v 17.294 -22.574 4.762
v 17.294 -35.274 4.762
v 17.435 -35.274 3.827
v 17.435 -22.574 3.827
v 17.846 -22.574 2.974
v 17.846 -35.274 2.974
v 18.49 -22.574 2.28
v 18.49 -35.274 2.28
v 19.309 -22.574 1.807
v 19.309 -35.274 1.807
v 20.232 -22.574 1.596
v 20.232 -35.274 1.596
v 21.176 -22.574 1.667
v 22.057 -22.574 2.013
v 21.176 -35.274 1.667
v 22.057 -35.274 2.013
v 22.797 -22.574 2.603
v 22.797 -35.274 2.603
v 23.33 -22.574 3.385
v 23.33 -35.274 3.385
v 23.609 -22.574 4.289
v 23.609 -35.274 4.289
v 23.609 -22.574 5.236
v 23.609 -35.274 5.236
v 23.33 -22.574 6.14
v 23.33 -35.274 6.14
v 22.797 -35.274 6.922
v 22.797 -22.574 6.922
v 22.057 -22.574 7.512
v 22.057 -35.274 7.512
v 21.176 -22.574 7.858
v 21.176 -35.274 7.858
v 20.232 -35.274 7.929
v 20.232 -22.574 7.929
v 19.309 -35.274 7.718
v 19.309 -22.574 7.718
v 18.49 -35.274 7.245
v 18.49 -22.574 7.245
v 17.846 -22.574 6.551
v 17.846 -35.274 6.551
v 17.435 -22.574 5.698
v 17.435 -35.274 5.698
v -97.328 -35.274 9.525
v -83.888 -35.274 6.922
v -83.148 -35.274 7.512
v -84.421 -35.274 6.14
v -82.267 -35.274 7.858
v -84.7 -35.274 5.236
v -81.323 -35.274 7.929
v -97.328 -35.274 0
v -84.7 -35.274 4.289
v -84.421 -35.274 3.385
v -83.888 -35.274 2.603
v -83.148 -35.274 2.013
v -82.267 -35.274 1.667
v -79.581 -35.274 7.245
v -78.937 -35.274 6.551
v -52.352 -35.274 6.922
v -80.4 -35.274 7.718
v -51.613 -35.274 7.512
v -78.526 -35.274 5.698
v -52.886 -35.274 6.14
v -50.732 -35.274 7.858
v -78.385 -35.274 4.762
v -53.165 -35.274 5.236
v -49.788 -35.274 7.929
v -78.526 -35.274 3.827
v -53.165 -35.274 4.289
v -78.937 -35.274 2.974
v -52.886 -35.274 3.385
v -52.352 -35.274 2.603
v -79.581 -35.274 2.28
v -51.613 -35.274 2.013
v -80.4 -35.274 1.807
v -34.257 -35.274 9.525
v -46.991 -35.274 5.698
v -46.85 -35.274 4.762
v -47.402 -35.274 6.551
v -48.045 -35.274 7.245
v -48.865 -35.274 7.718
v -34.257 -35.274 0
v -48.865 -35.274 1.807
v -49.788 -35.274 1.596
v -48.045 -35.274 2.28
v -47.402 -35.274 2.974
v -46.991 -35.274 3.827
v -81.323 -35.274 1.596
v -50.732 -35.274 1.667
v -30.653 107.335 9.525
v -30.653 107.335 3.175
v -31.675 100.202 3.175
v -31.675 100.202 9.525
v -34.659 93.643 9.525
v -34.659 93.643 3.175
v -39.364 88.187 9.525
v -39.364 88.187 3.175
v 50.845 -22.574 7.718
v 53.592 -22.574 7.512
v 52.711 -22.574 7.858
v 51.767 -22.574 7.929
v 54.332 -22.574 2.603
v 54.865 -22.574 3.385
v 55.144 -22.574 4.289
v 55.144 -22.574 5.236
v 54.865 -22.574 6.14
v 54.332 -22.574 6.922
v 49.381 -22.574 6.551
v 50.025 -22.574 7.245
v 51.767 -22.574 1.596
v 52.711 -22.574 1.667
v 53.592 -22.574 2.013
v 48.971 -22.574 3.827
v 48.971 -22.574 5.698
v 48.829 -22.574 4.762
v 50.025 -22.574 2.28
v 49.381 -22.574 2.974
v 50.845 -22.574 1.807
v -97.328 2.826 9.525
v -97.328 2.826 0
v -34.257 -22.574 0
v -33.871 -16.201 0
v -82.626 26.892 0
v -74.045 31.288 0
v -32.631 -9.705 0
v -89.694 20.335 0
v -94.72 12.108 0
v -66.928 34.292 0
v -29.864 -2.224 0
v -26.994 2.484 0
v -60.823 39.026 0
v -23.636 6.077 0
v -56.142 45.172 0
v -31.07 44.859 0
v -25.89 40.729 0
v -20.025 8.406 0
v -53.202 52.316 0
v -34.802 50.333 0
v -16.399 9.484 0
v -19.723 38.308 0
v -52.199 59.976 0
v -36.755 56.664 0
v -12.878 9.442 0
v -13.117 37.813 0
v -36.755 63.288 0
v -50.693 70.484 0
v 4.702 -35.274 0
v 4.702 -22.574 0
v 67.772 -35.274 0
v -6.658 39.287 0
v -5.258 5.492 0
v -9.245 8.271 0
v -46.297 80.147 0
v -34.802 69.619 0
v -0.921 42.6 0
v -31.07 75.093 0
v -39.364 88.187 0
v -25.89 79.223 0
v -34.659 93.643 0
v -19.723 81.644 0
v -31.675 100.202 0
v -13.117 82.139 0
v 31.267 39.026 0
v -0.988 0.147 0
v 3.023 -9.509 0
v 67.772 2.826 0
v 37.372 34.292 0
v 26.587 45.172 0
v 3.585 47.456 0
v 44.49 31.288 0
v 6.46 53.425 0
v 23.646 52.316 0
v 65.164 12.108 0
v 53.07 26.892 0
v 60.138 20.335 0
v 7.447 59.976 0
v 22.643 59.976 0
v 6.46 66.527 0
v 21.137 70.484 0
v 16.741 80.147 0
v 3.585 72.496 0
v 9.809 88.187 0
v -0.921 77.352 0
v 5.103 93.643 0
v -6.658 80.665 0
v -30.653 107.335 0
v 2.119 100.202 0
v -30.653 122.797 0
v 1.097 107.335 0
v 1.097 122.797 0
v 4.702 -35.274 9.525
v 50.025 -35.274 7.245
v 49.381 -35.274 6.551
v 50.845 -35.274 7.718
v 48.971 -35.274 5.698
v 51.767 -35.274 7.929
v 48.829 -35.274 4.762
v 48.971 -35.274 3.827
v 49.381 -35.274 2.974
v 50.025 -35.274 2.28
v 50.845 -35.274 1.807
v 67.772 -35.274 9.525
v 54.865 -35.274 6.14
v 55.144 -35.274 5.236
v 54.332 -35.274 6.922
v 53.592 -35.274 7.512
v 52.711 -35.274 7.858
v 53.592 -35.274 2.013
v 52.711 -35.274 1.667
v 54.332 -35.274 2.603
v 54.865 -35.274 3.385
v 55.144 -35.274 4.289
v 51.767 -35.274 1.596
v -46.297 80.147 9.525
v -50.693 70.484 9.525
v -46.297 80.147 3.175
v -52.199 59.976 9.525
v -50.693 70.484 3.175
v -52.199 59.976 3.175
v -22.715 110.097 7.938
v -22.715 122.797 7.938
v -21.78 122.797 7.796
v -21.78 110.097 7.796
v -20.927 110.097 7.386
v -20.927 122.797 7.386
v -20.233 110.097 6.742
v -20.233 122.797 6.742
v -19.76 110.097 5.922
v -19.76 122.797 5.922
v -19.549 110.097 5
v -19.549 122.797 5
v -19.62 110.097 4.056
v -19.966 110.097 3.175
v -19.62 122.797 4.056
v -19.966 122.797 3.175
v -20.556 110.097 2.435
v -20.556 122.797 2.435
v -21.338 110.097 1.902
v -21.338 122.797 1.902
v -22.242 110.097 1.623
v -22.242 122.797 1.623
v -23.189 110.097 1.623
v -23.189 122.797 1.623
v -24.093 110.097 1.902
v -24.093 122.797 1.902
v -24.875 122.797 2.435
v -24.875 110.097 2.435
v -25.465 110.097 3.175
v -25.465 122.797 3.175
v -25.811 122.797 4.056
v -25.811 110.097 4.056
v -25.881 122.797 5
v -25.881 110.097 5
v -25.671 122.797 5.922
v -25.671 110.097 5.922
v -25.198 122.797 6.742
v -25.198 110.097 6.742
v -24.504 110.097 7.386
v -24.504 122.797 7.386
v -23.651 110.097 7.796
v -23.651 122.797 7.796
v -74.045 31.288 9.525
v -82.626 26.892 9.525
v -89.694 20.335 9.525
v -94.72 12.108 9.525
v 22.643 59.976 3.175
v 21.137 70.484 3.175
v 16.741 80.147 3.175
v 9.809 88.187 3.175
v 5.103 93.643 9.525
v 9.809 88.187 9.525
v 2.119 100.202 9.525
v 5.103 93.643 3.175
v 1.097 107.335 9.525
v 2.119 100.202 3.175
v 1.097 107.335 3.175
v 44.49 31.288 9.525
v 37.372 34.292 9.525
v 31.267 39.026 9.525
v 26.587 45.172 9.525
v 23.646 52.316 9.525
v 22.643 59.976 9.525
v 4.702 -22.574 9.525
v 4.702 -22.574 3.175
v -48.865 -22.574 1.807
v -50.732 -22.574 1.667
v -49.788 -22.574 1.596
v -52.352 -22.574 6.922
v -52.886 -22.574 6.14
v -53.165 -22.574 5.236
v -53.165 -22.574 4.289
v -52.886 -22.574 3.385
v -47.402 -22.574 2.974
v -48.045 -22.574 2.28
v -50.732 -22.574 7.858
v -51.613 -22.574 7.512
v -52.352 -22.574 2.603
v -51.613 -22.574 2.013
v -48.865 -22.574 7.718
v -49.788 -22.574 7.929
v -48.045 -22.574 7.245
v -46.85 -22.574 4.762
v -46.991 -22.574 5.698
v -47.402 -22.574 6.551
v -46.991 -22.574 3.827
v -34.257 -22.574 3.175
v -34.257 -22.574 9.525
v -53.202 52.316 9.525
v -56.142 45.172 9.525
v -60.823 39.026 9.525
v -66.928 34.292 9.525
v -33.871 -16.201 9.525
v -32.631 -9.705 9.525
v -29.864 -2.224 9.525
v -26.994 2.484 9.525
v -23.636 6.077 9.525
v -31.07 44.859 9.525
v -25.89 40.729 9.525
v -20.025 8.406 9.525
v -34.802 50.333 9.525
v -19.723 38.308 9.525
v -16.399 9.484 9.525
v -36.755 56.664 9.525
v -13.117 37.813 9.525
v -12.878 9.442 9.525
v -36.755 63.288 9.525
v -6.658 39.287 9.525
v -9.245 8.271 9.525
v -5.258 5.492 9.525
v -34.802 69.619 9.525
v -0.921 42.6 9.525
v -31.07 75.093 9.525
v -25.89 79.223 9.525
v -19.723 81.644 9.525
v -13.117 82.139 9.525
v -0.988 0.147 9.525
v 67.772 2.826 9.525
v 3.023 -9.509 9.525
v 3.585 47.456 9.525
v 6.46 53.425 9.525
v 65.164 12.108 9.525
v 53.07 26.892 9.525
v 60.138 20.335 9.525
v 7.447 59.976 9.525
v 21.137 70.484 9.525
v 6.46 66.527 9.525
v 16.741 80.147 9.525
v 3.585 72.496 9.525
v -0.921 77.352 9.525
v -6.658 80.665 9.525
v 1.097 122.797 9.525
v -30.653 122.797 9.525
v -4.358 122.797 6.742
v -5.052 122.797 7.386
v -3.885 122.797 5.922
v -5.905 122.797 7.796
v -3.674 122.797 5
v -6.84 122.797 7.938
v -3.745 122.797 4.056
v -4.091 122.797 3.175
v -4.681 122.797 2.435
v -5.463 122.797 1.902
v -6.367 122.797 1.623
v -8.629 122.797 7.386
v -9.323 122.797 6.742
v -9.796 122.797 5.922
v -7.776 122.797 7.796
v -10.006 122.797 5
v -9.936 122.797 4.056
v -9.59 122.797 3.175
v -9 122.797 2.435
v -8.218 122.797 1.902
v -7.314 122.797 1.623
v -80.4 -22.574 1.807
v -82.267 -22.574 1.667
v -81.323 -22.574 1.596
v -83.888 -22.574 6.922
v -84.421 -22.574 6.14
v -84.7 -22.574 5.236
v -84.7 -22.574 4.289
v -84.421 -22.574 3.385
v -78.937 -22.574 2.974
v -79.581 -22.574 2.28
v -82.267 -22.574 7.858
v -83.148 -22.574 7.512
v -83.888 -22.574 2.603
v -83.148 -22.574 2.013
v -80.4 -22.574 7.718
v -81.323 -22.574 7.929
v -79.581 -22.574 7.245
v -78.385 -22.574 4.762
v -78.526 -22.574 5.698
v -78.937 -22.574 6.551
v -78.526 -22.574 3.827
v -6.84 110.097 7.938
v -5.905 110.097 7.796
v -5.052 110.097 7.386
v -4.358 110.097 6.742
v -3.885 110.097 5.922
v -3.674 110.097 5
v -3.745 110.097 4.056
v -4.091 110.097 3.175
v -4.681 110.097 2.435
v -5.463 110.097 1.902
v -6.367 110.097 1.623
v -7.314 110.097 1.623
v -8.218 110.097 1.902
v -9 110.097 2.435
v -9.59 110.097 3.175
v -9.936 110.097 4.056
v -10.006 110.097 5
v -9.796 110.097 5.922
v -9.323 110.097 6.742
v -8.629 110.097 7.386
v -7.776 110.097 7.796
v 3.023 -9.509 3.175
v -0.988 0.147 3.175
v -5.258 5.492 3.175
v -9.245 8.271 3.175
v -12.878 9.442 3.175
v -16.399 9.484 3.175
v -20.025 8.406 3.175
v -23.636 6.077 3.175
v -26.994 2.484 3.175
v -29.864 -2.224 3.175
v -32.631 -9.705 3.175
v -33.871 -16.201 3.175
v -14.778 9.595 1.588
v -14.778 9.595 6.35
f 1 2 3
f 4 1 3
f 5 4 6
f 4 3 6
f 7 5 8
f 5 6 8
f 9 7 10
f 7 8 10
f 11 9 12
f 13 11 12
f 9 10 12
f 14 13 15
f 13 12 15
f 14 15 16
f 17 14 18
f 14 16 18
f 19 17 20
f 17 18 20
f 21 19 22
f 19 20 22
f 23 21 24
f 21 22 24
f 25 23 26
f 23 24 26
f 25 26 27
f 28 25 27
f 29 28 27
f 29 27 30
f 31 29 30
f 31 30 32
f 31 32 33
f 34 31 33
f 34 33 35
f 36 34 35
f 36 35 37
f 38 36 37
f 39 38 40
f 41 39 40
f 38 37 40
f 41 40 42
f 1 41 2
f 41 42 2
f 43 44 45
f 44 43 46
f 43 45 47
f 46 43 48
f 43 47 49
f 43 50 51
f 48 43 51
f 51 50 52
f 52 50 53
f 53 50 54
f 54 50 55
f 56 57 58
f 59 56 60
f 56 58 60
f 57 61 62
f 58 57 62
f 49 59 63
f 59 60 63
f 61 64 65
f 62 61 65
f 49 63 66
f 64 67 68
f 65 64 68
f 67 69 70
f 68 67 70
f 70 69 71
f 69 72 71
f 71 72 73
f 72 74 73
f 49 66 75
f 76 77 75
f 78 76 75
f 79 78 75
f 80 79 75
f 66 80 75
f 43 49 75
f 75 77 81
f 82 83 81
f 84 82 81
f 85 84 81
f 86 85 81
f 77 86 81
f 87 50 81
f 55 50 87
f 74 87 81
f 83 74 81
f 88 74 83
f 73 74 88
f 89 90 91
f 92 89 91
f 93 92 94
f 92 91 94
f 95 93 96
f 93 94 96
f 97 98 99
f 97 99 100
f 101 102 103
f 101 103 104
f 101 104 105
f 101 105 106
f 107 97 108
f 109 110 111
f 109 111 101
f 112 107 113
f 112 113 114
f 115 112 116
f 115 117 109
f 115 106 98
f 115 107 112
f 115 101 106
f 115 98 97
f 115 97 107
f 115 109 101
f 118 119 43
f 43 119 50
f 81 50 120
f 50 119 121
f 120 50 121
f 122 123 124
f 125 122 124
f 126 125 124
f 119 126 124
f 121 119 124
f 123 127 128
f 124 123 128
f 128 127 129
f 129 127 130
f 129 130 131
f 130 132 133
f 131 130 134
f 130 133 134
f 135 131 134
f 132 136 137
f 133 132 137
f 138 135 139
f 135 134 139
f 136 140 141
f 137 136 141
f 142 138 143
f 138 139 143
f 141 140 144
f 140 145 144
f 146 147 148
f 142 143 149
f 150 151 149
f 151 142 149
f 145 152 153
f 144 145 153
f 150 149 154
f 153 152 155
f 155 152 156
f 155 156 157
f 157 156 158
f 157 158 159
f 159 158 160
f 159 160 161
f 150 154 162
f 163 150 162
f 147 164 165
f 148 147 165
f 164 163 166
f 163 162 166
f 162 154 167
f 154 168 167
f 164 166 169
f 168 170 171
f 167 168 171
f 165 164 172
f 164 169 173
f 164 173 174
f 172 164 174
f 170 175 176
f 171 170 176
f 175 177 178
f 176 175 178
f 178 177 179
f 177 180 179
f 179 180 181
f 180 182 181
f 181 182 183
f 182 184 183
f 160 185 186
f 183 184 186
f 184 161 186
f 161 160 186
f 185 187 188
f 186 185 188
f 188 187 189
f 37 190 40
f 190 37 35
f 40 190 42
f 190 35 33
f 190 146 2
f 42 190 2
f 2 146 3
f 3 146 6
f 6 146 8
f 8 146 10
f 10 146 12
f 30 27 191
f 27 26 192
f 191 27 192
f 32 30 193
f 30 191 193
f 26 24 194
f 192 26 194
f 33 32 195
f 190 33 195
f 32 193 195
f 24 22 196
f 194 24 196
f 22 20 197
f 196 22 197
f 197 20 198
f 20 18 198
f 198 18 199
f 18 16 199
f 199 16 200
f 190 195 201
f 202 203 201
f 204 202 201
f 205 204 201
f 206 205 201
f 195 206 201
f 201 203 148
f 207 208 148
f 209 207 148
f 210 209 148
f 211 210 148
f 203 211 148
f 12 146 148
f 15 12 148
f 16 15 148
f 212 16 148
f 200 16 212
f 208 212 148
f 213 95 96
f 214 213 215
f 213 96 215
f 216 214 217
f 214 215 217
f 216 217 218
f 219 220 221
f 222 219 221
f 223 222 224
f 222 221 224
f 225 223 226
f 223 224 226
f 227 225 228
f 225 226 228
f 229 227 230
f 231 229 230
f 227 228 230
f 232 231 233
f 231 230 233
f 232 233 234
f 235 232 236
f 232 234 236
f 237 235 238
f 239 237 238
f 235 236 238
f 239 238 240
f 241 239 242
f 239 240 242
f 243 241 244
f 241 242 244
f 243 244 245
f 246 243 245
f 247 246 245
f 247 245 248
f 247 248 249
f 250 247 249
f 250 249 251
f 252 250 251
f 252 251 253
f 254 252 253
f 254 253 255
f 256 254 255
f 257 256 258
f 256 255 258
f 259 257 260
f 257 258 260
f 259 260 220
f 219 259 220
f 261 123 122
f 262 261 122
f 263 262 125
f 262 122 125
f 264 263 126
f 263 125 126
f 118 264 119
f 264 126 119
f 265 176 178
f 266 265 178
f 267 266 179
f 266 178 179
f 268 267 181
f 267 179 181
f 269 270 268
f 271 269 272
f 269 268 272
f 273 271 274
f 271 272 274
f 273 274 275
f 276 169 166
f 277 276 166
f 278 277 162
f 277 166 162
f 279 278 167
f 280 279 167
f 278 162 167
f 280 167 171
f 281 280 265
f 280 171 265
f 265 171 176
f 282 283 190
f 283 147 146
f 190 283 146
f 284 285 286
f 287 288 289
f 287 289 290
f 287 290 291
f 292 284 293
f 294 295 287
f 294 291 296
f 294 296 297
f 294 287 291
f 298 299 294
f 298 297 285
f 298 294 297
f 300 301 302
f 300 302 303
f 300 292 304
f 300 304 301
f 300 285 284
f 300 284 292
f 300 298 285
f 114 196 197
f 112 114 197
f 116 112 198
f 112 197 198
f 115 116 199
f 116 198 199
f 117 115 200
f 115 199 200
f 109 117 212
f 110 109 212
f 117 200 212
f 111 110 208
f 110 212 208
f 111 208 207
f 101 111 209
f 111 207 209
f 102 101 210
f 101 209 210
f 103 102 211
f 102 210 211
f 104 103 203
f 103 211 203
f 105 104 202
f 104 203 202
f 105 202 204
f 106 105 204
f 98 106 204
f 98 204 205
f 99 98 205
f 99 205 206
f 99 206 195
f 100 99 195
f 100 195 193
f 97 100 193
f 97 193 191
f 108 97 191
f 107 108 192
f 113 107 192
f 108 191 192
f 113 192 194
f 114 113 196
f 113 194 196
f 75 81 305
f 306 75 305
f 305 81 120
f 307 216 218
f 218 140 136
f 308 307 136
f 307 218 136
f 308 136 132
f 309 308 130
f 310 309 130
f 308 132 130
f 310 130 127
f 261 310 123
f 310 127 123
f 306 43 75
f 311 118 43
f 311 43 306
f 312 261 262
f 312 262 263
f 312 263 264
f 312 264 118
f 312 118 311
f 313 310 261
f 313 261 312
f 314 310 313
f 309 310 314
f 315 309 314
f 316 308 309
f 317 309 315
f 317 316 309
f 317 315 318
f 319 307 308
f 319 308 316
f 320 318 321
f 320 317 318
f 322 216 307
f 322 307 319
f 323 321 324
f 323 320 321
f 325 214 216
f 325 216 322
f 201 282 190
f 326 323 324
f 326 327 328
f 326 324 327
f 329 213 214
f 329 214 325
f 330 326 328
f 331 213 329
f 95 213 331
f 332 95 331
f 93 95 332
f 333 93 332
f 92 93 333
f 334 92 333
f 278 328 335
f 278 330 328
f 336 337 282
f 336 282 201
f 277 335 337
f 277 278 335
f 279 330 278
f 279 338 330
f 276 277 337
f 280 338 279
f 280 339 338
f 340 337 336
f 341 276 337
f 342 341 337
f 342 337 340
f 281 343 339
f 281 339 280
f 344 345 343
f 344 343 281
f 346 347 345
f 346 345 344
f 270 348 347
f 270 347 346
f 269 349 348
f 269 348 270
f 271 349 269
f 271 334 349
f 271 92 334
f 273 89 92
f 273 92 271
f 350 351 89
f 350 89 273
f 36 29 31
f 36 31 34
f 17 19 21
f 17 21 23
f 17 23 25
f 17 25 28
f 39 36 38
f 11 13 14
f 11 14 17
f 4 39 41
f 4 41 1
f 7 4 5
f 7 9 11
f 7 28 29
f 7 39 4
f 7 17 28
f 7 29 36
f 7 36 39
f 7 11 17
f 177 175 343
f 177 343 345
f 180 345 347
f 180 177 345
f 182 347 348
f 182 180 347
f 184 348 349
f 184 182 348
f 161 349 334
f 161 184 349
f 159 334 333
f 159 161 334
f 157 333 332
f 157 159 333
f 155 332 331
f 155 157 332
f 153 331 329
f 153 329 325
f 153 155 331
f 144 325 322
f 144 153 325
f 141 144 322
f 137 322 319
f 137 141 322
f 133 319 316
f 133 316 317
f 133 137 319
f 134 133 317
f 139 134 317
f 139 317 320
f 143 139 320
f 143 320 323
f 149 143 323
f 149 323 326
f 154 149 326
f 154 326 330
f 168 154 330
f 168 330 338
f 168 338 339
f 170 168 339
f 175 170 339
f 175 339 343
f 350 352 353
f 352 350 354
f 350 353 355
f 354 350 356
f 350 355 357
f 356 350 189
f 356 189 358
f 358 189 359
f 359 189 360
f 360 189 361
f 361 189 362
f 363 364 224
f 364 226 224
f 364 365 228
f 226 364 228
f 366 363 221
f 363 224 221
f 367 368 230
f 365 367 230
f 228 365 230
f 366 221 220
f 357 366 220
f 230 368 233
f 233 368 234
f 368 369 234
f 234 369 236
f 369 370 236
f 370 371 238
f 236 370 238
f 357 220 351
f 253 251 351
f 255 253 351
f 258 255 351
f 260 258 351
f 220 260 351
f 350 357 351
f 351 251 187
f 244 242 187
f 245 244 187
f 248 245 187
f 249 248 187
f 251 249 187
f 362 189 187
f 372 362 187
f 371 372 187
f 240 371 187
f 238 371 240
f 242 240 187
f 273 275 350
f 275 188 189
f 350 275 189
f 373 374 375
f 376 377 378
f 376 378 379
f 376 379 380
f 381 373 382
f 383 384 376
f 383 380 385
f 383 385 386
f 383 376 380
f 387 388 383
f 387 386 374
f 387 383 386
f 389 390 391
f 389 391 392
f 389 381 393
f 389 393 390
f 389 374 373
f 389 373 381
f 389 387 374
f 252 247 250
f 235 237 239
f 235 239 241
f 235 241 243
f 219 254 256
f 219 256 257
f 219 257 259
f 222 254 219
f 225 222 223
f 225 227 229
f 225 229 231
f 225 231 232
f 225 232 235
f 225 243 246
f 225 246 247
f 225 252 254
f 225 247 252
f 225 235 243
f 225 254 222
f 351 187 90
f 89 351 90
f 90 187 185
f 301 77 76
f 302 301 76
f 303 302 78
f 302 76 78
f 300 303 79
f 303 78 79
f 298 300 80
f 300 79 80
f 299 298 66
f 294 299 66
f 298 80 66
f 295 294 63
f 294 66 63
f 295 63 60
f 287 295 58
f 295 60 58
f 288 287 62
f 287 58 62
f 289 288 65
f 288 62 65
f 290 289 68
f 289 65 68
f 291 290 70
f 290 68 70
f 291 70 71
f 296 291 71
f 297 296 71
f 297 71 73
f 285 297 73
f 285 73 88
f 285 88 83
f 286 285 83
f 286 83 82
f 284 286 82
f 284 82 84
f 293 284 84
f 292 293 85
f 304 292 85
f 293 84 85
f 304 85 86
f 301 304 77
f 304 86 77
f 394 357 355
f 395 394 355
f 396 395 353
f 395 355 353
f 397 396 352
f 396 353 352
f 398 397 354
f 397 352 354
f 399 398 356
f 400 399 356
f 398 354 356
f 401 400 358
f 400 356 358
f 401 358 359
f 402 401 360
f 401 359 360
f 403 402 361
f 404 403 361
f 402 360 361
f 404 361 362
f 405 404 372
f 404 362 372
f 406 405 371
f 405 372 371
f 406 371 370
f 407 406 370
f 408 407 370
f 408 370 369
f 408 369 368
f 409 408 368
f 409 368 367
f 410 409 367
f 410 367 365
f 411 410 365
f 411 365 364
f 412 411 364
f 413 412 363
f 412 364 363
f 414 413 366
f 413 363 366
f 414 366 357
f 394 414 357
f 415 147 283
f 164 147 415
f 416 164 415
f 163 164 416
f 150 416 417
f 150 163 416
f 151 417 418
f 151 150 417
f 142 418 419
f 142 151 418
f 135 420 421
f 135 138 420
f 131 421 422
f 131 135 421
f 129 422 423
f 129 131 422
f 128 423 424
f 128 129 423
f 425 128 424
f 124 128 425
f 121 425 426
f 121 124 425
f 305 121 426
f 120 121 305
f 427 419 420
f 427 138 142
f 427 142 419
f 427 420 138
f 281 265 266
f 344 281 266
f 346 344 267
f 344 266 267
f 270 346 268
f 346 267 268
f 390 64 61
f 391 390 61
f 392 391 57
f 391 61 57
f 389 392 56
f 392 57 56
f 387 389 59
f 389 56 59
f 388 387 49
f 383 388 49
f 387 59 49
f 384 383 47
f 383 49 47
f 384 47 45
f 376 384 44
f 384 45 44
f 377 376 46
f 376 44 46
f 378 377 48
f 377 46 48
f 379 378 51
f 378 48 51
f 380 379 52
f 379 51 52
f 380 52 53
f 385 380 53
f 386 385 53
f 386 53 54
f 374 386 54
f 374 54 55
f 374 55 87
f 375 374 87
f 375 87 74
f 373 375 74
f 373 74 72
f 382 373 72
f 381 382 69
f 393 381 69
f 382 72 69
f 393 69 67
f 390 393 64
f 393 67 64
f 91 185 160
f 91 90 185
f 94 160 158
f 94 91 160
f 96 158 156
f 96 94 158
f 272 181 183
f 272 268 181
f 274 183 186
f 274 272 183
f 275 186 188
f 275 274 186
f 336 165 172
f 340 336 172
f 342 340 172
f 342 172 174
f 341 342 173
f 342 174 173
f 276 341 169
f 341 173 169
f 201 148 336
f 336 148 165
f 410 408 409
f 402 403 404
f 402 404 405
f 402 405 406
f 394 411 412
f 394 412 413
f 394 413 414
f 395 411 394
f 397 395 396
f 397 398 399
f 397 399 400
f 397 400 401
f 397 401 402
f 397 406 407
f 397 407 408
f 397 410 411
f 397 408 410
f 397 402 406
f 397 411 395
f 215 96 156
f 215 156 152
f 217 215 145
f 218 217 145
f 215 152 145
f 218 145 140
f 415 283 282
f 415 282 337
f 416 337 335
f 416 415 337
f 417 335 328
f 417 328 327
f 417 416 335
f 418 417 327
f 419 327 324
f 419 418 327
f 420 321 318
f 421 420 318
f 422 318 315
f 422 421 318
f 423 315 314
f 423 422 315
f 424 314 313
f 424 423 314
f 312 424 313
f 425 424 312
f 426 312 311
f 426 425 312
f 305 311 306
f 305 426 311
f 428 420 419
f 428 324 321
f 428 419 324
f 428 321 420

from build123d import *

# Parameters (mm, degrees)
SKETCH1_R           = 19.61817075
BOSS_EXTRUDE1_DEPTH = 3.175
FILLET1_R           = 25.4
SKETCH2_R           = 15.875
BOSS_EXTRUDE2_DEPTH = 12.7
CUT_EXTRUDE3_START  = -6.35
SKETCH5_R           = 15.875
CUT_EXTRUDE3_DEPTH  = 6.35
SKETCH3_R           = 3.175
CUT_EXTRUDE1_DEPTH  = 12.7
SKETCH4_R           = 3.175
CUT_EXTRUDE2_DEPTH  = 12.7
CUT_EXTRUDE4_START  = -23.876
SKETCH7_R           = 22.225
SKETCH7_R_2         = 15.875
CUT_EXTRUDE4_DEPTH  = 23.876


with BuildPart() as part:
    # Sketch1 → Boss-Extrude1 (new body)
    with BuildSketch(Plane.XY):
        with BuildLine():
            ThreePointArc((44.489667751, 31.288325121), (28.726604254, 41.946482698), (22.64318373, 59.97597211))
            ThreePointArc((22.64318373, 59.97597211), (16.800558188, 80.054274158), (1.097123352, 93.862844712))
            Line((1.097123352, 93.862844712), (1.097123352, 122.797032487))
            Line((1.097123352, 122.797032487), (-30.652876648, 122.797032487))
            Line((-30.652876648, 122.797032487), (-30.652876648, 93.862844712))
            ThreePointArc((-30.652876648, 93.862844712), (-46.356311483, 80.054274158), (-52.198937025, 59.97597211))
            ThreePointArc((-52.198937025, 59.97597211), (-58.282357549, 41.946482698), (-74.045421046, 31.288325121))
            ThreePointArc((-74.045421046, 31.288325121), (-89.694055432, 20.335242519), (-97.327876648, 2.82597211))
            Line((-97.327876648, 2.82597211), (-97.327876648, -35.27402789))
            Line((-97.327876648, -35.27402789), (-34.257381722, -35.27402789))
            Line((-34.257381722, -35.27402789), (-34.257381722, -22.57402789))
            add(Edge.make_bspline(
                [(4.701628427, -22.57402789), (4.701628427, 9.595471172), (-14.777876648, 9.595471172), (-34.257381722, 9.595471172), (-34.257381722, -22.57402789)],
                knots=[1.570796327, 1.570796327, 1.570796327, 3.141592654, 3.141592654, 4.71238898, 4.71238898, 4.71238898], degree=2, weights=[1, 0.707106781, 1, 0.707106781, 1]))
            Line((4.701628427, -22.57402789), (4.701628427, -35.27402789))
            Line((4.701628427, -35.27402789), (67.772123352, -35.27402789))
            Line((67.772123352, -35.27402789), (67.772123352, 2.82597211))
            ThreePointArc((67.772123352, 2.82597211), (60.138302137, 20.335242519), (44.489667751, 31.288325121))
        make_face()
        with Locations((-14.777876648, 59.97597211)):
            Circle(SKETCH1_R, mode=Mode.SUBTRACT)
    extrude(amount=BOSS_EXTRUDE1_DEPTH)

    # Fillet1
    fillet1_edges = [part.edges().sort_by_distance(p)[0] for p in [
        (-30.652876648, 93.862844712, 1.5875),
        (1.097123352, 93.862844712, 1.5875),
    ]]
    fillet(fillet1_edges, radius=FILLET1_R)

    # Sketch2 → Boss-Extrude2 (add)
    with BuildSketch(Plane.XY.offset(3.175)):
        with BuildLine():
            Line((1.097123352, 107.334815022), (1.097123352, 122.797032487))
            Line((1.097123352, 122.797032487), (-30.652876648, 122.797032487))
            Line((-30.652876648, 122.797032487), (-30.652876648, 107.334815022))
            ThreePointArc((-30.652876648, 107.334815022), (-32.933121295, 96.816406756), (-39.364444557, 88.186545274))
            ThreePointArc((-39.364444557, 88.186545274), (-48.83952078, 75.47242844), (-52.198937025, 59.97597211))
            ThreePointArc((-52.198937025, 59.97597211), (-58.282357549, 41.946482698), (-74.045421046, 31.288325121))
            ThreePointArc((-74.045421046, 31.288325121), (-89.694055432, 20.335242519), (-97.327876648, 2.82597211))
            Line((-97.327876648, 2.82597211), (-97.327876648, -35.27402789))
            Line((-97.327876648, -35.27402789), (-34.257381722, -35.27402789))
            Line((-34.257381722, -35.27402789), (-34.257381722, -22.57402789))
            add(Edge.make_bspline(
                [(4.701628427, -22.57402789), (4.701628427, 9.595471172), (-14.777876648, 9.595471172), (-34.257381722, 9.595471172), (-34.257381722, -22.57402789)],
                knots=[1.570796327, 1.570796327, 1.570796327, 3.141592654, 3.141592654, 4.71238898, 4.71238898, 4.71238898], degree=2, weights=[1, 0.707106781, 1, 0.707106781, 1]))
            Line((4.701628427, -22.57402789), (4.701628427, -35.27402789))
            Line((4.701628427, -35.27402789), (67.772123352, -35.27402789))
            Line((67.772123352, -35.27402789), (67.772123352, 2.82597211))
            ThreePointArc((67.772123352, 2.82597211), (60.138302137, 20.335242519), (44.489667751, 31.288325121))
            ThreePointArc((44.489667751, 31.288325121), (28.726604254, 41.946482698), (22.64318373, 59.97597211))
            ThreePointArc((22.64318373, 59.97597211), (19.283767485, 75.47242844), (9.808691261, 88.186545274))
            ThreePointArc((9.808691261, 88.186545274), (3.377368, 96.816406756), (1.097123352, 107.334815022))
        make_face()
        with Locations((-14.777876648, 59.97597211)):
            Circle(SKETCH2_R, mode=Mode.SUBTRACT)
    extrude(amount=BOSS_EXTRUDE2_DEPTH)

    # Sketch5 → Cut-Extrude3 (cut)
    with BuildSketch(Plane.XY.offset(15.875).offset(CUT_EXTRUDE3_START)):
        with BuildLine():
            Line((1.097123352, 107.334815022), (1.097123352, 122.797032487))
            Line((1.097123352, 122.797032487), (-30.652876648, 122.797032487))
            Line((-30.652876648, 122.797032487), (-30.652876648, 107.334815022))
            ThreePointArc((-30.652876648, 107.334815022), (-32.933121295, 96.816406756), (-39.364444557, 88.186545274))
            ThreePointArc((-39.364444557, 88.186545274), (-48.83952078, 75.47242844), (-52.198937025, 59.97597211))
            ThreePointArc((-52.198937025, 59.97597211), (-58.282357549, 41.946482698), (-74.045421046, 31.288325121))
            ThreePointArc((-74.045421046, 31.288325121), (-89.694055432, 20.335242519), (-97.327876648, 2.82597211))
            Line((-97.327876648, 2.82597211), (-97.327876648, -35.27402789))
            Line((-97.327876648, -35.27402789), (-34.257381722, -35.27402789))
            Line((-34.257381722, -35.27402789), (-34.257381722, -22.57402789))
            add(Edge.make_bspline(
                [(4.701628427, -22.57402789), (4.701628427, 9.595471172), (-14.777876648, 9.595471172), (-34.257381722, 9.595471172), (-34.257381722, -22.57402789)],
                knots=[1.570796327, 1.570796327, 1.570796327, 3.141592654, 3.141592654, 4.71238898, 4.71238898, 4.71238898], degree=2, weights=[1, 0.707106781, 1, 0.707106781, 1]))
            Line((4.701628427, -22.57402789), (4.701628427, -35.27402789))
            Line((4.701628427, -35.27402789), (67.772123352, -35.27402789))
            Line((67.772123352, -35.27402789), (67.772123352, 2.82597211))
            ThreePointArc((67.772123352, 2.82597211), (60.138302137, 20.335242519), (44.489667751, 31.288325121))
            ThreePointArc((44.489667751, 31.288325121), (28.726604254, 41.946482698), (22.64318373, 59.97597211))
            ThreePointArc((22.64318373, 59.97597211), (19.283767485, 75.47242844), (9.808691261, 88.186545274))
            ThreePointArc((9.808691261, 88.186545274), (3.377368, 96.816406756), (1.097123352, 107.334815022))
        make_face()
        with Locations((-14.777876648, 59.97597211)):
            Circle(SKETCH5_R, mode=Mode.SUBTRACT)
    extrude(amount=CUT_EXTRUDE3_DEPTH, mode=Mode.SUBTRACT)

    # Sketch3 → Cut-Extrude1 (cut)
    with BuildSketch(Plane.XZ.offset(35.27402789)):
        with Locations((-50.025005454, 4.7625)):
            Circle(SKETCH3_R)
        with Locations((-81.560252916, 4.7625)):
            Circle(SKETCH3_R)
        with Locations(Location((20.469252158, 4.7625, 0), (0, 0, 180))):
            Circle(SKETCH3_R)
        with Locations(Location((52.004499621, 4.7625, 0), (0, 0, 180))):
            Circle(SKETCH3_R)
    extrude(amount=-CUT_EXTRUDE1_DEPTH, mode=Mode.SUBTRACT)

    # Sketch4 → Cut-Extrude2 (cut)
    with BuildSketch(Plane(origin=(0, 122.797032487, 0), x_dir=(1, 0, 0), z_dir=(0, 1, 0))):
        with Locations(Location((-22.715376648, -4.7625, 0), (0, 0, 270))):
            Circle(SKETCH4_R)
        with Locations(Location((-6.840376648, -4.7625, 0), (0, 0, 270))):
            Circle(SKETCH4_R)
    extrude(amount=-CUT_EXTRUDE2_DEPTH, mode=Mode.SUBTRACT)

    # Sketch7 → Cut-Extrude4 (cut)
    with BuildSketch(Plane.XY.offset(9.525).offset(CUT_EXTRUDE4_START)):
        with Locations((-14.777876648, 59.97597211)):
            Circle(SKETCH7_R)
        with Locations((-14.777876648, 59.97597211)):
            Circle(SKETCH7_R_2, mode=Mode.SUBTRACT)
    extrude(amount=CUT_EXTRUDE4_DEPTH, mode=Mode.SUBTRACT)


solid = part.part
